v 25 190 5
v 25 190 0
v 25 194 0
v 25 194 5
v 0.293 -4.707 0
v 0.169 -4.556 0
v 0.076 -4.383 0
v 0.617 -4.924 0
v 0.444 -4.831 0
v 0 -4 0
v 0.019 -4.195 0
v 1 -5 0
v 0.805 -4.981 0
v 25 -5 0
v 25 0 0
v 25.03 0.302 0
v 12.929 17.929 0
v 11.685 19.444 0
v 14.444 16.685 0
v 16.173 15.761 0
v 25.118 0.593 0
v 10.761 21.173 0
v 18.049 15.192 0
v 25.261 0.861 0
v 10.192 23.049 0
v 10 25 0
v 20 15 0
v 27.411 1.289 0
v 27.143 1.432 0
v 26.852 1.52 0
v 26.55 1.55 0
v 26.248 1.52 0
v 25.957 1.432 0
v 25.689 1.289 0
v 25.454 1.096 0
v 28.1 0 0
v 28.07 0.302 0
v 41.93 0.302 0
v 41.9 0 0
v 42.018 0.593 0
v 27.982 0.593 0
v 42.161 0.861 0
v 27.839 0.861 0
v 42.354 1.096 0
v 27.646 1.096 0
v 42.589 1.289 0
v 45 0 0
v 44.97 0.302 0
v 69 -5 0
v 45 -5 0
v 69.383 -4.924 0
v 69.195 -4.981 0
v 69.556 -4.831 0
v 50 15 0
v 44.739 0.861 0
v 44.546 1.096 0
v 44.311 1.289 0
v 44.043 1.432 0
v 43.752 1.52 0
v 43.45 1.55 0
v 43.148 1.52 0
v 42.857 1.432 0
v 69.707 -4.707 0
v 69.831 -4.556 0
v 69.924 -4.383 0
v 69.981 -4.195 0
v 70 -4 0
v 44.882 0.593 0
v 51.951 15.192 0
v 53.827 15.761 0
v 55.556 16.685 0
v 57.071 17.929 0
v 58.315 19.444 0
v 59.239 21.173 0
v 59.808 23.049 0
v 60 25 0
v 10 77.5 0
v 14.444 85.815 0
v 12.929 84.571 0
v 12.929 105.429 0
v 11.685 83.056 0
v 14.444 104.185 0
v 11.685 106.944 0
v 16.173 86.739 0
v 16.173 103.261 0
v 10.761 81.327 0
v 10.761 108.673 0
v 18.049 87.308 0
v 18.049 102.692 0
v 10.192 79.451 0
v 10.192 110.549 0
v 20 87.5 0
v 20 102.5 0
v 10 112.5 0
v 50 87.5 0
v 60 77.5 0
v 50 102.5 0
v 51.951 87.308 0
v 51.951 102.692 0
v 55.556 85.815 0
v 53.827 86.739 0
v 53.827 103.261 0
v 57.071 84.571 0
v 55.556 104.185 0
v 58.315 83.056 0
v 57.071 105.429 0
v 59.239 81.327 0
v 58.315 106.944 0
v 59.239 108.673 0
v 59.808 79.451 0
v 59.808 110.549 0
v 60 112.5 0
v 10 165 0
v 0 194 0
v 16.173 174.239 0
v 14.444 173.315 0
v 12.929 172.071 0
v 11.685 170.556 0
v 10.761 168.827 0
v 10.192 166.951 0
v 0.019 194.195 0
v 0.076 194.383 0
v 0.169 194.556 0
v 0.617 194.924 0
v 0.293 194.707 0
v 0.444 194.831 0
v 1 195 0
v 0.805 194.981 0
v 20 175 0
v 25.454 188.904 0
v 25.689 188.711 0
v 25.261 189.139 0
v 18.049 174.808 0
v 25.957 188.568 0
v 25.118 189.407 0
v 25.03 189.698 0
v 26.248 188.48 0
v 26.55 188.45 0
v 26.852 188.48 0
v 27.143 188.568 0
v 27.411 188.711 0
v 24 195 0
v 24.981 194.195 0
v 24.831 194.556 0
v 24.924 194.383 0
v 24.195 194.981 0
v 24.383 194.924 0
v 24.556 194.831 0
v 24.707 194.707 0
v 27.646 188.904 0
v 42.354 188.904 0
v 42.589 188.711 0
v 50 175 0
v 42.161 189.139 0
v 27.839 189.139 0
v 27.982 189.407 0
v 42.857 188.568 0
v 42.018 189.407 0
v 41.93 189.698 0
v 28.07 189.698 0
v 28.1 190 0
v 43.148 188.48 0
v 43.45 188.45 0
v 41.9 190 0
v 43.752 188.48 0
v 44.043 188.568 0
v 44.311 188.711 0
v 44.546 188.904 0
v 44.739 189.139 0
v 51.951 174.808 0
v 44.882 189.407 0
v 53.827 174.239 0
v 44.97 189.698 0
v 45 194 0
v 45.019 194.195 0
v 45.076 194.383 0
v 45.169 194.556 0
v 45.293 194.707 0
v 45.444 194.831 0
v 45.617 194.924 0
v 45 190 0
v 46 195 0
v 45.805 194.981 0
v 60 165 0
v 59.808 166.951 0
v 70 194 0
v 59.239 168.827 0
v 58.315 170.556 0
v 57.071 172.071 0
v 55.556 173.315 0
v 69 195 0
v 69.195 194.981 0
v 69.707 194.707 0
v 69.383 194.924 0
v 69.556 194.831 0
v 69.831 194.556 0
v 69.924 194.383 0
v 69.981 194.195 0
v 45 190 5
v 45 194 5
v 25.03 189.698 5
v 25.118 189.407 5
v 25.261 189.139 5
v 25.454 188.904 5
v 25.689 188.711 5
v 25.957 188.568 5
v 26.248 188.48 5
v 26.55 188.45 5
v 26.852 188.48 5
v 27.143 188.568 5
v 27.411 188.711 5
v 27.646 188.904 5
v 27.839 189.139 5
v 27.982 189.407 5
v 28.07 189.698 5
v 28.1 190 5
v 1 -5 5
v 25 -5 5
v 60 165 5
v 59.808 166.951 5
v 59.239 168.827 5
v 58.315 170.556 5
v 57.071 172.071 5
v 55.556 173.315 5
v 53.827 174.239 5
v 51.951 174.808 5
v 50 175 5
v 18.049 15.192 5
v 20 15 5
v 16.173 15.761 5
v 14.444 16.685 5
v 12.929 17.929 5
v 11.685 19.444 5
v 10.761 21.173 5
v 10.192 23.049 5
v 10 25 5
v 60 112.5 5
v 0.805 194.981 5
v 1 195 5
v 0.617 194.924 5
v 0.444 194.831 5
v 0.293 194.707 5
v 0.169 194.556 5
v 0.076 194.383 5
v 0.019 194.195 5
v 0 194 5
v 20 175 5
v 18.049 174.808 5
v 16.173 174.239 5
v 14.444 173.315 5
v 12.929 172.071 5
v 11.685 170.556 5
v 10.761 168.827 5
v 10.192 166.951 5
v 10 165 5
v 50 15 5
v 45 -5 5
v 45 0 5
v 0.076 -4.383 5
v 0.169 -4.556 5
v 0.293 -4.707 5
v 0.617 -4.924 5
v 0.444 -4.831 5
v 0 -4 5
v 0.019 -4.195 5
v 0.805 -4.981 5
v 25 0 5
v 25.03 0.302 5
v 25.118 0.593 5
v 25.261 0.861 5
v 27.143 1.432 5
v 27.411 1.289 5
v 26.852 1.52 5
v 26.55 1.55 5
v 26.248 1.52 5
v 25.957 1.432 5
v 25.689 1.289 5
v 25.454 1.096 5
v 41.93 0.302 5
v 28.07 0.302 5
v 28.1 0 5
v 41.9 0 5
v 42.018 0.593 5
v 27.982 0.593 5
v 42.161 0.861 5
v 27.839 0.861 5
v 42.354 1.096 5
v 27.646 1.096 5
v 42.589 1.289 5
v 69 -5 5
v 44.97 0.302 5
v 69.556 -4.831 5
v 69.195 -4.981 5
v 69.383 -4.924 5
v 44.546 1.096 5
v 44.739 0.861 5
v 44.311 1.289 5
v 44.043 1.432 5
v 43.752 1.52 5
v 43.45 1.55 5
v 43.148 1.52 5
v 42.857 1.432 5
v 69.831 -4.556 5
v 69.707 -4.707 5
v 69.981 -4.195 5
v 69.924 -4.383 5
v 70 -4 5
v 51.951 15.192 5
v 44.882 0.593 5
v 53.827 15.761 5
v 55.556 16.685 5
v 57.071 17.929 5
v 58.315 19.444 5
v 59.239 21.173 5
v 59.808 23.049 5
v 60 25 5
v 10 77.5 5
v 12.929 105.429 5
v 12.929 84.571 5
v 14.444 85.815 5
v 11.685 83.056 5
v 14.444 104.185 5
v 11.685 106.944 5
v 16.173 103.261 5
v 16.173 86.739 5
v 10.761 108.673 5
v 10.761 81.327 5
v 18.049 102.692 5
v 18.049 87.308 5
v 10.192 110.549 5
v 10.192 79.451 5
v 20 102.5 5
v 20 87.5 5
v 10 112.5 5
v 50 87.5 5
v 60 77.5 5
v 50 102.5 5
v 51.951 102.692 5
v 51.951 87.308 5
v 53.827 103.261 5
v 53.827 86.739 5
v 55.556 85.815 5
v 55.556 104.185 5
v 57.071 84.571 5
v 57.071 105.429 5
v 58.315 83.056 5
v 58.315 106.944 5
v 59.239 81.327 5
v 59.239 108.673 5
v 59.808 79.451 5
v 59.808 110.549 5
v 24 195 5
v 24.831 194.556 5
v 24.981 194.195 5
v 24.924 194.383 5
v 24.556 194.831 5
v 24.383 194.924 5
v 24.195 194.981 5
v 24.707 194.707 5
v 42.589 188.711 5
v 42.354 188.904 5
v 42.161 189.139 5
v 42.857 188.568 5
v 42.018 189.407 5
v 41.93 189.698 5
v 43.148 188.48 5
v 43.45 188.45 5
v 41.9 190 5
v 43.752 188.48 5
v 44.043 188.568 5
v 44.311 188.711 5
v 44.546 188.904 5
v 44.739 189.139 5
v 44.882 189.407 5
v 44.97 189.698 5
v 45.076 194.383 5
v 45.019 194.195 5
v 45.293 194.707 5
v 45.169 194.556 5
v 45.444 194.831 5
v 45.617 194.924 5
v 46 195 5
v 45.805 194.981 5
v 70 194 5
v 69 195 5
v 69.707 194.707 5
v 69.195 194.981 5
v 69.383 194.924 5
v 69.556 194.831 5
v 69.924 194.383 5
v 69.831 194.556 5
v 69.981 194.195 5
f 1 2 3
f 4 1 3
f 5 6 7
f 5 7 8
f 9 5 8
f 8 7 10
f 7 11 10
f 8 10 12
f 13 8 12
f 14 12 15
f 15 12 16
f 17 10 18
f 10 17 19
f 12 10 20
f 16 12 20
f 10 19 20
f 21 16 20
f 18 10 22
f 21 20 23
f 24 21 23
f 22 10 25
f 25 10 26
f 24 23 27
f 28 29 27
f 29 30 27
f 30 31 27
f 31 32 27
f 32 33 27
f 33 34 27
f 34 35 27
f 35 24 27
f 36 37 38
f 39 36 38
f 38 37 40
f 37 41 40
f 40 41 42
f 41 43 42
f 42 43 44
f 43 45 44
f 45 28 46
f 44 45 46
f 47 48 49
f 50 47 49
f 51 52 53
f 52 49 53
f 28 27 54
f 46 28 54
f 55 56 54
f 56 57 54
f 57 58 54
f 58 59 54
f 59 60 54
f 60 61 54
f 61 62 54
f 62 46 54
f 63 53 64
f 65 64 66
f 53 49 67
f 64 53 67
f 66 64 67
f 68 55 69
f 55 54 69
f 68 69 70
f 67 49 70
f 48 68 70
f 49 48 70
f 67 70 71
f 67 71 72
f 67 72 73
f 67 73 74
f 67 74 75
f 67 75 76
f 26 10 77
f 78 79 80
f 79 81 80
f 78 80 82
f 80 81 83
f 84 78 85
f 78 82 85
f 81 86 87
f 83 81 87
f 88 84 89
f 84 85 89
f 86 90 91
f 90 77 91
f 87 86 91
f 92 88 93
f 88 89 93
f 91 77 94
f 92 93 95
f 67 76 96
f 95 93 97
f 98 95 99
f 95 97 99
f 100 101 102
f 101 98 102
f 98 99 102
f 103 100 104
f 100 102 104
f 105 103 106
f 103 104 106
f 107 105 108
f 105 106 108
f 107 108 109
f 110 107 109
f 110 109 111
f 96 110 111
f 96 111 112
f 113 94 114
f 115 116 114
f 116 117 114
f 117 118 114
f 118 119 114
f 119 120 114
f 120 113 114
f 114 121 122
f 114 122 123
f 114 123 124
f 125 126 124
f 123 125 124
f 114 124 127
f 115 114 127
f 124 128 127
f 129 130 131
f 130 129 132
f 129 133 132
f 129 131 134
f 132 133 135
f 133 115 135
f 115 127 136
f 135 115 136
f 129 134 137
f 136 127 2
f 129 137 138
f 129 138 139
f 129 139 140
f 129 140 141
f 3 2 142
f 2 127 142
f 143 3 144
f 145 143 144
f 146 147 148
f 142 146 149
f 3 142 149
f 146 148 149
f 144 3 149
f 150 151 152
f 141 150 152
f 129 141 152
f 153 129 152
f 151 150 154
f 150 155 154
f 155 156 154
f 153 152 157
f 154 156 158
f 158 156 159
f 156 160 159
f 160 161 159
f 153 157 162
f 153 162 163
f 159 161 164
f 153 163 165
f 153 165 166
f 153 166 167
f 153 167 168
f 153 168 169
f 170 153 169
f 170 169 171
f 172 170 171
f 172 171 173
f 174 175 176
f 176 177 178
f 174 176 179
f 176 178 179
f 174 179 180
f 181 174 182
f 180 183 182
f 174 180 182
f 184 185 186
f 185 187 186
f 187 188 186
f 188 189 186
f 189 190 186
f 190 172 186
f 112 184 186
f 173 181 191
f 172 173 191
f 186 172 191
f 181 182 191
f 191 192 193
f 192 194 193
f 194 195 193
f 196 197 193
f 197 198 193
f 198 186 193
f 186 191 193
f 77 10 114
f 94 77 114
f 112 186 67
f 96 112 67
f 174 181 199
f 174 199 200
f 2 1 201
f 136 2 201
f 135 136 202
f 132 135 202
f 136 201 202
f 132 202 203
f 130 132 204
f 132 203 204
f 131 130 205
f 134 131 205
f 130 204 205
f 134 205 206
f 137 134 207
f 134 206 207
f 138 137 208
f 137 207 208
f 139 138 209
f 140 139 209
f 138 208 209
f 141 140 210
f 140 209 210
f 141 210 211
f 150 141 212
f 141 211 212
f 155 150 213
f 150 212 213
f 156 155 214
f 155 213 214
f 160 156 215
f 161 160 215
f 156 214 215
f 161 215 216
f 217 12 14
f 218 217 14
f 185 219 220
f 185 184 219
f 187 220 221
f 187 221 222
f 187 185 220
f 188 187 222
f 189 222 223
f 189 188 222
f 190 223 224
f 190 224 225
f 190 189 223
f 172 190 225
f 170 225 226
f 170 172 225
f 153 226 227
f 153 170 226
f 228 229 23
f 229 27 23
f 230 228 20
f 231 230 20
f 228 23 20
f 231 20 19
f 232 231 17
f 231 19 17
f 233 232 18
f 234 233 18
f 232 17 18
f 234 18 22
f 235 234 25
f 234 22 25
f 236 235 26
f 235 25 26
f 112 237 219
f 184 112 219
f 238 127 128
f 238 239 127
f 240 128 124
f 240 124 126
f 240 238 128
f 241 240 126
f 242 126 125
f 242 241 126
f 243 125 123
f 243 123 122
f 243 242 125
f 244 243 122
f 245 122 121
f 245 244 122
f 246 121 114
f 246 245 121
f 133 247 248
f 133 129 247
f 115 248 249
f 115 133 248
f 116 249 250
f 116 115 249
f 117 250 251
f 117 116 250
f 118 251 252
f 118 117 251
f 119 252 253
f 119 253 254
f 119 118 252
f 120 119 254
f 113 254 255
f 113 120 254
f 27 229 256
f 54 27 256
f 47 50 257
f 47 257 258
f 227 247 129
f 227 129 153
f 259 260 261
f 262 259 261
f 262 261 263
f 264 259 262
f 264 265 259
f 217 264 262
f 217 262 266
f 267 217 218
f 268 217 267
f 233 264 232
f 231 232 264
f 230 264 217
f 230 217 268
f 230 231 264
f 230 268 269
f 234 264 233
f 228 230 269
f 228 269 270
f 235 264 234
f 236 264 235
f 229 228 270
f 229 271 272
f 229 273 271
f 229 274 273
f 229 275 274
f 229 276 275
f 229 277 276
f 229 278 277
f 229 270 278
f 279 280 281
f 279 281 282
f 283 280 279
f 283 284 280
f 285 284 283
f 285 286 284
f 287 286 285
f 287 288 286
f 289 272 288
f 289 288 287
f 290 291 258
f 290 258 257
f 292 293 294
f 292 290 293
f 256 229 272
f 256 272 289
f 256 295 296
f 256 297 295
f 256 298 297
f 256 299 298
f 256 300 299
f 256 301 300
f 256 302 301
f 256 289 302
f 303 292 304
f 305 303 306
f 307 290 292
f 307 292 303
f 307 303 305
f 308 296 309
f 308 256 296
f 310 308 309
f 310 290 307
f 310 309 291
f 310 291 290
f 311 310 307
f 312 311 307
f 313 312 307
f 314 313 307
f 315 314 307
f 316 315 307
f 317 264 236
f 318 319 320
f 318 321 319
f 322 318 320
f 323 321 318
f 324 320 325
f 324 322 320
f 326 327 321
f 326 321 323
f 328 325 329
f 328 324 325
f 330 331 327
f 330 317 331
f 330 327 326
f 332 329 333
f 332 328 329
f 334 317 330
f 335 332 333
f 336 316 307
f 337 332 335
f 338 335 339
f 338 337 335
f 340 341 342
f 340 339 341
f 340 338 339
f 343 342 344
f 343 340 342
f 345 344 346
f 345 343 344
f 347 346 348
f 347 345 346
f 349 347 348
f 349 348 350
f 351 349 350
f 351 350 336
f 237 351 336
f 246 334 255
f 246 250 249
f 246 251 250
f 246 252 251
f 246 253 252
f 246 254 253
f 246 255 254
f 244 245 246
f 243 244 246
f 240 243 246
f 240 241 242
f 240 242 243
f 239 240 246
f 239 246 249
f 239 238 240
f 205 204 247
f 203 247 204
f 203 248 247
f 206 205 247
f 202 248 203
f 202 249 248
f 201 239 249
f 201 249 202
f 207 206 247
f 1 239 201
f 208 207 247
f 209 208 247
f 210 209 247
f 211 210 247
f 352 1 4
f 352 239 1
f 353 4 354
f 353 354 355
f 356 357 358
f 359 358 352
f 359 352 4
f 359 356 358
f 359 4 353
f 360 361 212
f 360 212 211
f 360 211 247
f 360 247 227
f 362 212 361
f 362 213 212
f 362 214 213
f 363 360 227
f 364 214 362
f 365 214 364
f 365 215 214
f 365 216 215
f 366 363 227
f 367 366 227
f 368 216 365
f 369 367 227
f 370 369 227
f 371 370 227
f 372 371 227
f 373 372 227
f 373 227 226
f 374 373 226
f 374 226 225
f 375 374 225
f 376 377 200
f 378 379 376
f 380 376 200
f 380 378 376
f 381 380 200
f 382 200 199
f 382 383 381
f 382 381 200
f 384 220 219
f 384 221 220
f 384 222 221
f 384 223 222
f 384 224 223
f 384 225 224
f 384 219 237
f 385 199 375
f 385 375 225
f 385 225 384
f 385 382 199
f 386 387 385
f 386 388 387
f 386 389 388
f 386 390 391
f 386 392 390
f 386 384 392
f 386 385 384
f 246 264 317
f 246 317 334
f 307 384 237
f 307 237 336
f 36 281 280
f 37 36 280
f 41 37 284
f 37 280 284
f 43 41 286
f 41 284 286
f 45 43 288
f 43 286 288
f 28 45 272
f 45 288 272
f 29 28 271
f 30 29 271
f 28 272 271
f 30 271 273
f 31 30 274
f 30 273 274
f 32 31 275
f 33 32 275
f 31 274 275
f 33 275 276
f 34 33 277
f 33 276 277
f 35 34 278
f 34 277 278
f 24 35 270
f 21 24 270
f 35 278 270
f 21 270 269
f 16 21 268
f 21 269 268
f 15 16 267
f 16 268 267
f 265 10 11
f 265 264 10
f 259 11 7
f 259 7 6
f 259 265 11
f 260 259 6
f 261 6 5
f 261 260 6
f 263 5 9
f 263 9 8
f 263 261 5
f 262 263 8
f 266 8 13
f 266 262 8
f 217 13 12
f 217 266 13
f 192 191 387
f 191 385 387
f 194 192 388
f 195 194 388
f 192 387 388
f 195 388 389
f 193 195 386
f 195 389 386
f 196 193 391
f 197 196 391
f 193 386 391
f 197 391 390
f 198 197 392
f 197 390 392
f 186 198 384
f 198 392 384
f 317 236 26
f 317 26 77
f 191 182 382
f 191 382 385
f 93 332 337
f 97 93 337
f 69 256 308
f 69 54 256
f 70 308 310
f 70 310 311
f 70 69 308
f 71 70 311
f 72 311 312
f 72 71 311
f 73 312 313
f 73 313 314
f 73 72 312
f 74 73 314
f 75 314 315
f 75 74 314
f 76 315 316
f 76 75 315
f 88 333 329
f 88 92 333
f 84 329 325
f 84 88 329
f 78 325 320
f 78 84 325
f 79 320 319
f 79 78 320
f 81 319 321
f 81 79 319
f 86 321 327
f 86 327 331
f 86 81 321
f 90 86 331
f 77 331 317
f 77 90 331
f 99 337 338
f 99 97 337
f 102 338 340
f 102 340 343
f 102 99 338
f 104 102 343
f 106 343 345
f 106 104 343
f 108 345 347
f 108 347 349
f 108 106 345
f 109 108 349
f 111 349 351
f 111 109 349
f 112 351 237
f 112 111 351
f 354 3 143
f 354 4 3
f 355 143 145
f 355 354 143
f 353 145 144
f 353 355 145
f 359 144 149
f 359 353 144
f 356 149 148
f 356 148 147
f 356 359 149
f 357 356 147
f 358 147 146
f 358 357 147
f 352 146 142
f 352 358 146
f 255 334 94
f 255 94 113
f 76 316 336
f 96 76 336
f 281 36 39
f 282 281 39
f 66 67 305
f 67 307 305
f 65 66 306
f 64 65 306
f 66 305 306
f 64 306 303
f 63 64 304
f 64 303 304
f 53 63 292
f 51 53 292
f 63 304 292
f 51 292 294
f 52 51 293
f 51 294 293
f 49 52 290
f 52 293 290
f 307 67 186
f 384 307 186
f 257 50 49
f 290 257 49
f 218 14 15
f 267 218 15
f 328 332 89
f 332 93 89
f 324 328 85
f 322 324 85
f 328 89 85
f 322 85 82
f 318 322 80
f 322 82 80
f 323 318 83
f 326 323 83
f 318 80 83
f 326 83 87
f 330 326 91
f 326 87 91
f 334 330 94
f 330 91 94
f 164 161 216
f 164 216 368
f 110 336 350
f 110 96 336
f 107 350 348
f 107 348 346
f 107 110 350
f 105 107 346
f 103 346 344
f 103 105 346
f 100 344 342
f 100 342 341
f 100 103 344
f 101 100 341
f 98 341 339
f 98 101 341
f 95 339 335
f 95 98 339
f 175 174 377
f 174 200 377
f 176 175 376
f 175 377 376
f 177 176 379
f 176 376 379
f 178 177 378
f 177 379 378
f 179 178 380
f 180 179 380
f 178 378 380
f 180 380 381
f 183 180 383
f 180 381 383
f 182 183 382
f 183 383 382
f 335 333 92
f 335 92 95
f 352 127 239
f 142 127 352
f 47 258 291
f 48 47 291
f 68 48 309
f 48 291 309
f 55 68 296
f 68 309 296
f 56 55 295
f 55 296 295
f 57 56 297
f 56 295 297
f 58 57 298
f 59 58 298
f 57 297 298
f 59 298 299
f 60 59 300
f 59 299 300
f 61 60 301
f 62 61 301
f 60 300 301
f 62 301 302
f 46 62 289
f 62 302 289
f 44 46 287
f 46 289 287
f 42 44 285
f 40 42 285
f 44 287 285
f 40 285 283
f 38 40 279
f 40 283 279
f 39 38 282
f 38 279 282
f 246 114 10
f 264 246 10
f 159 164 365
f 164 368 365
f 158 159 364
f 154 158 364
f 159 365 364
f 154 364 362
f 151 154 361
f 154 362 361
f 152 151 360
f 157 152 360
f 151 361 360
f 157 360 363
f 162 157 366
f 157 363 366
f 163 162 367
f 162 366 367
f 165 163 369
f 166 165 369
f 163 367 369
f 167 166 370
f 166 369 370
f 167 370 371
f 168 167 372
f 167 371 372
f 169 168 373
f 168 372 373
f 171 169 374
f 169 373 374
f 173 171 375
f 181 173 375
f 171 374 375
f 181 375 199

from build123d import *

# Parameters (mm, degrees)
SKETCH_1_W          = 25
SKETCH_1_H          = 5
SKETCH_1_W_2        = 70
SKETCH_1_H_2        = 190
EXTRUDE_1_DEPTH     = 5
SKETCH_2_R          = 1.55
CUT_EXTRUDE_1_DEPTH = 5
SKETCH_3_W          = 50
SKETCH_3_H          = 72.5
CUT_EXTRUDE_2_DEPTH = 5
FILLET_1_R          = 10
FILLET_2_R          = 1


with BuildPart() as part:
    # 草图1 → 凸台-拉伸1 (new body)
    with BuildSketch(Plane.XY):
        with Locations((57.5, 192.5)):
            Rectangle(SKETCH_1_W, SKETCH_1_H)
        with Locations((35, 95)):
            Rectangle(SKETCH_1_W_2, SKETCH_1_H_2)
        with Locations((12.5, 192.5)):
            Rectangle(SKETCH_1_W, SKETCH_1_H)
        with Locations((57.5, -2.5)):
            Rectangle(SKETCH_1_W, SKETCH_1_H)
        with Locations((12.5, -2.5)):
            Rectangle(SKETCH_1_W, SKETCH_1_H)
    extrude(amount=EXTRUDE_1_DEPTH)

    # 草图2 → 切除-拉伸1 (cut)
    with BuildSketch(Plane.XY.offset(5)):
        with Locations((43.45, 0)):
            Circle(SKETCH_2_R)
        with Locations((26.55, 0)):
            Circle(SKETCH_2_R)
        with Locations((43.45, 190)):
            Circle(SKETCH_2_R)
        with Locations((26.55, 190)):
            Circle(SKETCH_2_R)
    extrude(amount=-CUT_EXTRUDE_1_DEPTH, mode=Mode.SUBTRACT)

    # 草图3 → 切除-拉伸2 (cut)
    with BuildSketch(Plane.XY.offset(5)):
        with Locations((35, 51.25)):
            Rectangle(SKETCH_3_W, SKETCH_3_H)
        with Locations((35, 138.75)):
            Rectangle(SKETCH_3_W, SKETCH_3_H)
    extrude(amount=-CUT_EXTRUDE_2_DEPTH, mode=Mode.SUBTRACT)

    # 圆角1
    fillet_1_edges = [part.edges().sort_by_distance(p)[0] for p in [
        (10, 15, 2.5),
        (10, 87.5, 2.5),
        (60, 87.5, 2.5),
        (60, 15, 2.5),
        (10, 102.5, 2.5),
        (10, 175, 2.5),
        (60, 175, 2.5),
        (60, 102.5, 2.5),
    ]]
    fillet(fillet_1_edges, radius=FILLET_1_R)

    # 圆角2
    fillet_2_edges = [part.edges().sort_by_distance(p)[0] for p in [
        (45, 195, 2.5),
        (70, 195, 2.5),
        (70, -5, 2.5),
        (0, -5, 2.5),
        (0, 195, 2.5),
        (25, 195, 2.5),
    ]]
    fillet(fillet_2_edges, radius=FILLET_2_R)


solid = part.part
